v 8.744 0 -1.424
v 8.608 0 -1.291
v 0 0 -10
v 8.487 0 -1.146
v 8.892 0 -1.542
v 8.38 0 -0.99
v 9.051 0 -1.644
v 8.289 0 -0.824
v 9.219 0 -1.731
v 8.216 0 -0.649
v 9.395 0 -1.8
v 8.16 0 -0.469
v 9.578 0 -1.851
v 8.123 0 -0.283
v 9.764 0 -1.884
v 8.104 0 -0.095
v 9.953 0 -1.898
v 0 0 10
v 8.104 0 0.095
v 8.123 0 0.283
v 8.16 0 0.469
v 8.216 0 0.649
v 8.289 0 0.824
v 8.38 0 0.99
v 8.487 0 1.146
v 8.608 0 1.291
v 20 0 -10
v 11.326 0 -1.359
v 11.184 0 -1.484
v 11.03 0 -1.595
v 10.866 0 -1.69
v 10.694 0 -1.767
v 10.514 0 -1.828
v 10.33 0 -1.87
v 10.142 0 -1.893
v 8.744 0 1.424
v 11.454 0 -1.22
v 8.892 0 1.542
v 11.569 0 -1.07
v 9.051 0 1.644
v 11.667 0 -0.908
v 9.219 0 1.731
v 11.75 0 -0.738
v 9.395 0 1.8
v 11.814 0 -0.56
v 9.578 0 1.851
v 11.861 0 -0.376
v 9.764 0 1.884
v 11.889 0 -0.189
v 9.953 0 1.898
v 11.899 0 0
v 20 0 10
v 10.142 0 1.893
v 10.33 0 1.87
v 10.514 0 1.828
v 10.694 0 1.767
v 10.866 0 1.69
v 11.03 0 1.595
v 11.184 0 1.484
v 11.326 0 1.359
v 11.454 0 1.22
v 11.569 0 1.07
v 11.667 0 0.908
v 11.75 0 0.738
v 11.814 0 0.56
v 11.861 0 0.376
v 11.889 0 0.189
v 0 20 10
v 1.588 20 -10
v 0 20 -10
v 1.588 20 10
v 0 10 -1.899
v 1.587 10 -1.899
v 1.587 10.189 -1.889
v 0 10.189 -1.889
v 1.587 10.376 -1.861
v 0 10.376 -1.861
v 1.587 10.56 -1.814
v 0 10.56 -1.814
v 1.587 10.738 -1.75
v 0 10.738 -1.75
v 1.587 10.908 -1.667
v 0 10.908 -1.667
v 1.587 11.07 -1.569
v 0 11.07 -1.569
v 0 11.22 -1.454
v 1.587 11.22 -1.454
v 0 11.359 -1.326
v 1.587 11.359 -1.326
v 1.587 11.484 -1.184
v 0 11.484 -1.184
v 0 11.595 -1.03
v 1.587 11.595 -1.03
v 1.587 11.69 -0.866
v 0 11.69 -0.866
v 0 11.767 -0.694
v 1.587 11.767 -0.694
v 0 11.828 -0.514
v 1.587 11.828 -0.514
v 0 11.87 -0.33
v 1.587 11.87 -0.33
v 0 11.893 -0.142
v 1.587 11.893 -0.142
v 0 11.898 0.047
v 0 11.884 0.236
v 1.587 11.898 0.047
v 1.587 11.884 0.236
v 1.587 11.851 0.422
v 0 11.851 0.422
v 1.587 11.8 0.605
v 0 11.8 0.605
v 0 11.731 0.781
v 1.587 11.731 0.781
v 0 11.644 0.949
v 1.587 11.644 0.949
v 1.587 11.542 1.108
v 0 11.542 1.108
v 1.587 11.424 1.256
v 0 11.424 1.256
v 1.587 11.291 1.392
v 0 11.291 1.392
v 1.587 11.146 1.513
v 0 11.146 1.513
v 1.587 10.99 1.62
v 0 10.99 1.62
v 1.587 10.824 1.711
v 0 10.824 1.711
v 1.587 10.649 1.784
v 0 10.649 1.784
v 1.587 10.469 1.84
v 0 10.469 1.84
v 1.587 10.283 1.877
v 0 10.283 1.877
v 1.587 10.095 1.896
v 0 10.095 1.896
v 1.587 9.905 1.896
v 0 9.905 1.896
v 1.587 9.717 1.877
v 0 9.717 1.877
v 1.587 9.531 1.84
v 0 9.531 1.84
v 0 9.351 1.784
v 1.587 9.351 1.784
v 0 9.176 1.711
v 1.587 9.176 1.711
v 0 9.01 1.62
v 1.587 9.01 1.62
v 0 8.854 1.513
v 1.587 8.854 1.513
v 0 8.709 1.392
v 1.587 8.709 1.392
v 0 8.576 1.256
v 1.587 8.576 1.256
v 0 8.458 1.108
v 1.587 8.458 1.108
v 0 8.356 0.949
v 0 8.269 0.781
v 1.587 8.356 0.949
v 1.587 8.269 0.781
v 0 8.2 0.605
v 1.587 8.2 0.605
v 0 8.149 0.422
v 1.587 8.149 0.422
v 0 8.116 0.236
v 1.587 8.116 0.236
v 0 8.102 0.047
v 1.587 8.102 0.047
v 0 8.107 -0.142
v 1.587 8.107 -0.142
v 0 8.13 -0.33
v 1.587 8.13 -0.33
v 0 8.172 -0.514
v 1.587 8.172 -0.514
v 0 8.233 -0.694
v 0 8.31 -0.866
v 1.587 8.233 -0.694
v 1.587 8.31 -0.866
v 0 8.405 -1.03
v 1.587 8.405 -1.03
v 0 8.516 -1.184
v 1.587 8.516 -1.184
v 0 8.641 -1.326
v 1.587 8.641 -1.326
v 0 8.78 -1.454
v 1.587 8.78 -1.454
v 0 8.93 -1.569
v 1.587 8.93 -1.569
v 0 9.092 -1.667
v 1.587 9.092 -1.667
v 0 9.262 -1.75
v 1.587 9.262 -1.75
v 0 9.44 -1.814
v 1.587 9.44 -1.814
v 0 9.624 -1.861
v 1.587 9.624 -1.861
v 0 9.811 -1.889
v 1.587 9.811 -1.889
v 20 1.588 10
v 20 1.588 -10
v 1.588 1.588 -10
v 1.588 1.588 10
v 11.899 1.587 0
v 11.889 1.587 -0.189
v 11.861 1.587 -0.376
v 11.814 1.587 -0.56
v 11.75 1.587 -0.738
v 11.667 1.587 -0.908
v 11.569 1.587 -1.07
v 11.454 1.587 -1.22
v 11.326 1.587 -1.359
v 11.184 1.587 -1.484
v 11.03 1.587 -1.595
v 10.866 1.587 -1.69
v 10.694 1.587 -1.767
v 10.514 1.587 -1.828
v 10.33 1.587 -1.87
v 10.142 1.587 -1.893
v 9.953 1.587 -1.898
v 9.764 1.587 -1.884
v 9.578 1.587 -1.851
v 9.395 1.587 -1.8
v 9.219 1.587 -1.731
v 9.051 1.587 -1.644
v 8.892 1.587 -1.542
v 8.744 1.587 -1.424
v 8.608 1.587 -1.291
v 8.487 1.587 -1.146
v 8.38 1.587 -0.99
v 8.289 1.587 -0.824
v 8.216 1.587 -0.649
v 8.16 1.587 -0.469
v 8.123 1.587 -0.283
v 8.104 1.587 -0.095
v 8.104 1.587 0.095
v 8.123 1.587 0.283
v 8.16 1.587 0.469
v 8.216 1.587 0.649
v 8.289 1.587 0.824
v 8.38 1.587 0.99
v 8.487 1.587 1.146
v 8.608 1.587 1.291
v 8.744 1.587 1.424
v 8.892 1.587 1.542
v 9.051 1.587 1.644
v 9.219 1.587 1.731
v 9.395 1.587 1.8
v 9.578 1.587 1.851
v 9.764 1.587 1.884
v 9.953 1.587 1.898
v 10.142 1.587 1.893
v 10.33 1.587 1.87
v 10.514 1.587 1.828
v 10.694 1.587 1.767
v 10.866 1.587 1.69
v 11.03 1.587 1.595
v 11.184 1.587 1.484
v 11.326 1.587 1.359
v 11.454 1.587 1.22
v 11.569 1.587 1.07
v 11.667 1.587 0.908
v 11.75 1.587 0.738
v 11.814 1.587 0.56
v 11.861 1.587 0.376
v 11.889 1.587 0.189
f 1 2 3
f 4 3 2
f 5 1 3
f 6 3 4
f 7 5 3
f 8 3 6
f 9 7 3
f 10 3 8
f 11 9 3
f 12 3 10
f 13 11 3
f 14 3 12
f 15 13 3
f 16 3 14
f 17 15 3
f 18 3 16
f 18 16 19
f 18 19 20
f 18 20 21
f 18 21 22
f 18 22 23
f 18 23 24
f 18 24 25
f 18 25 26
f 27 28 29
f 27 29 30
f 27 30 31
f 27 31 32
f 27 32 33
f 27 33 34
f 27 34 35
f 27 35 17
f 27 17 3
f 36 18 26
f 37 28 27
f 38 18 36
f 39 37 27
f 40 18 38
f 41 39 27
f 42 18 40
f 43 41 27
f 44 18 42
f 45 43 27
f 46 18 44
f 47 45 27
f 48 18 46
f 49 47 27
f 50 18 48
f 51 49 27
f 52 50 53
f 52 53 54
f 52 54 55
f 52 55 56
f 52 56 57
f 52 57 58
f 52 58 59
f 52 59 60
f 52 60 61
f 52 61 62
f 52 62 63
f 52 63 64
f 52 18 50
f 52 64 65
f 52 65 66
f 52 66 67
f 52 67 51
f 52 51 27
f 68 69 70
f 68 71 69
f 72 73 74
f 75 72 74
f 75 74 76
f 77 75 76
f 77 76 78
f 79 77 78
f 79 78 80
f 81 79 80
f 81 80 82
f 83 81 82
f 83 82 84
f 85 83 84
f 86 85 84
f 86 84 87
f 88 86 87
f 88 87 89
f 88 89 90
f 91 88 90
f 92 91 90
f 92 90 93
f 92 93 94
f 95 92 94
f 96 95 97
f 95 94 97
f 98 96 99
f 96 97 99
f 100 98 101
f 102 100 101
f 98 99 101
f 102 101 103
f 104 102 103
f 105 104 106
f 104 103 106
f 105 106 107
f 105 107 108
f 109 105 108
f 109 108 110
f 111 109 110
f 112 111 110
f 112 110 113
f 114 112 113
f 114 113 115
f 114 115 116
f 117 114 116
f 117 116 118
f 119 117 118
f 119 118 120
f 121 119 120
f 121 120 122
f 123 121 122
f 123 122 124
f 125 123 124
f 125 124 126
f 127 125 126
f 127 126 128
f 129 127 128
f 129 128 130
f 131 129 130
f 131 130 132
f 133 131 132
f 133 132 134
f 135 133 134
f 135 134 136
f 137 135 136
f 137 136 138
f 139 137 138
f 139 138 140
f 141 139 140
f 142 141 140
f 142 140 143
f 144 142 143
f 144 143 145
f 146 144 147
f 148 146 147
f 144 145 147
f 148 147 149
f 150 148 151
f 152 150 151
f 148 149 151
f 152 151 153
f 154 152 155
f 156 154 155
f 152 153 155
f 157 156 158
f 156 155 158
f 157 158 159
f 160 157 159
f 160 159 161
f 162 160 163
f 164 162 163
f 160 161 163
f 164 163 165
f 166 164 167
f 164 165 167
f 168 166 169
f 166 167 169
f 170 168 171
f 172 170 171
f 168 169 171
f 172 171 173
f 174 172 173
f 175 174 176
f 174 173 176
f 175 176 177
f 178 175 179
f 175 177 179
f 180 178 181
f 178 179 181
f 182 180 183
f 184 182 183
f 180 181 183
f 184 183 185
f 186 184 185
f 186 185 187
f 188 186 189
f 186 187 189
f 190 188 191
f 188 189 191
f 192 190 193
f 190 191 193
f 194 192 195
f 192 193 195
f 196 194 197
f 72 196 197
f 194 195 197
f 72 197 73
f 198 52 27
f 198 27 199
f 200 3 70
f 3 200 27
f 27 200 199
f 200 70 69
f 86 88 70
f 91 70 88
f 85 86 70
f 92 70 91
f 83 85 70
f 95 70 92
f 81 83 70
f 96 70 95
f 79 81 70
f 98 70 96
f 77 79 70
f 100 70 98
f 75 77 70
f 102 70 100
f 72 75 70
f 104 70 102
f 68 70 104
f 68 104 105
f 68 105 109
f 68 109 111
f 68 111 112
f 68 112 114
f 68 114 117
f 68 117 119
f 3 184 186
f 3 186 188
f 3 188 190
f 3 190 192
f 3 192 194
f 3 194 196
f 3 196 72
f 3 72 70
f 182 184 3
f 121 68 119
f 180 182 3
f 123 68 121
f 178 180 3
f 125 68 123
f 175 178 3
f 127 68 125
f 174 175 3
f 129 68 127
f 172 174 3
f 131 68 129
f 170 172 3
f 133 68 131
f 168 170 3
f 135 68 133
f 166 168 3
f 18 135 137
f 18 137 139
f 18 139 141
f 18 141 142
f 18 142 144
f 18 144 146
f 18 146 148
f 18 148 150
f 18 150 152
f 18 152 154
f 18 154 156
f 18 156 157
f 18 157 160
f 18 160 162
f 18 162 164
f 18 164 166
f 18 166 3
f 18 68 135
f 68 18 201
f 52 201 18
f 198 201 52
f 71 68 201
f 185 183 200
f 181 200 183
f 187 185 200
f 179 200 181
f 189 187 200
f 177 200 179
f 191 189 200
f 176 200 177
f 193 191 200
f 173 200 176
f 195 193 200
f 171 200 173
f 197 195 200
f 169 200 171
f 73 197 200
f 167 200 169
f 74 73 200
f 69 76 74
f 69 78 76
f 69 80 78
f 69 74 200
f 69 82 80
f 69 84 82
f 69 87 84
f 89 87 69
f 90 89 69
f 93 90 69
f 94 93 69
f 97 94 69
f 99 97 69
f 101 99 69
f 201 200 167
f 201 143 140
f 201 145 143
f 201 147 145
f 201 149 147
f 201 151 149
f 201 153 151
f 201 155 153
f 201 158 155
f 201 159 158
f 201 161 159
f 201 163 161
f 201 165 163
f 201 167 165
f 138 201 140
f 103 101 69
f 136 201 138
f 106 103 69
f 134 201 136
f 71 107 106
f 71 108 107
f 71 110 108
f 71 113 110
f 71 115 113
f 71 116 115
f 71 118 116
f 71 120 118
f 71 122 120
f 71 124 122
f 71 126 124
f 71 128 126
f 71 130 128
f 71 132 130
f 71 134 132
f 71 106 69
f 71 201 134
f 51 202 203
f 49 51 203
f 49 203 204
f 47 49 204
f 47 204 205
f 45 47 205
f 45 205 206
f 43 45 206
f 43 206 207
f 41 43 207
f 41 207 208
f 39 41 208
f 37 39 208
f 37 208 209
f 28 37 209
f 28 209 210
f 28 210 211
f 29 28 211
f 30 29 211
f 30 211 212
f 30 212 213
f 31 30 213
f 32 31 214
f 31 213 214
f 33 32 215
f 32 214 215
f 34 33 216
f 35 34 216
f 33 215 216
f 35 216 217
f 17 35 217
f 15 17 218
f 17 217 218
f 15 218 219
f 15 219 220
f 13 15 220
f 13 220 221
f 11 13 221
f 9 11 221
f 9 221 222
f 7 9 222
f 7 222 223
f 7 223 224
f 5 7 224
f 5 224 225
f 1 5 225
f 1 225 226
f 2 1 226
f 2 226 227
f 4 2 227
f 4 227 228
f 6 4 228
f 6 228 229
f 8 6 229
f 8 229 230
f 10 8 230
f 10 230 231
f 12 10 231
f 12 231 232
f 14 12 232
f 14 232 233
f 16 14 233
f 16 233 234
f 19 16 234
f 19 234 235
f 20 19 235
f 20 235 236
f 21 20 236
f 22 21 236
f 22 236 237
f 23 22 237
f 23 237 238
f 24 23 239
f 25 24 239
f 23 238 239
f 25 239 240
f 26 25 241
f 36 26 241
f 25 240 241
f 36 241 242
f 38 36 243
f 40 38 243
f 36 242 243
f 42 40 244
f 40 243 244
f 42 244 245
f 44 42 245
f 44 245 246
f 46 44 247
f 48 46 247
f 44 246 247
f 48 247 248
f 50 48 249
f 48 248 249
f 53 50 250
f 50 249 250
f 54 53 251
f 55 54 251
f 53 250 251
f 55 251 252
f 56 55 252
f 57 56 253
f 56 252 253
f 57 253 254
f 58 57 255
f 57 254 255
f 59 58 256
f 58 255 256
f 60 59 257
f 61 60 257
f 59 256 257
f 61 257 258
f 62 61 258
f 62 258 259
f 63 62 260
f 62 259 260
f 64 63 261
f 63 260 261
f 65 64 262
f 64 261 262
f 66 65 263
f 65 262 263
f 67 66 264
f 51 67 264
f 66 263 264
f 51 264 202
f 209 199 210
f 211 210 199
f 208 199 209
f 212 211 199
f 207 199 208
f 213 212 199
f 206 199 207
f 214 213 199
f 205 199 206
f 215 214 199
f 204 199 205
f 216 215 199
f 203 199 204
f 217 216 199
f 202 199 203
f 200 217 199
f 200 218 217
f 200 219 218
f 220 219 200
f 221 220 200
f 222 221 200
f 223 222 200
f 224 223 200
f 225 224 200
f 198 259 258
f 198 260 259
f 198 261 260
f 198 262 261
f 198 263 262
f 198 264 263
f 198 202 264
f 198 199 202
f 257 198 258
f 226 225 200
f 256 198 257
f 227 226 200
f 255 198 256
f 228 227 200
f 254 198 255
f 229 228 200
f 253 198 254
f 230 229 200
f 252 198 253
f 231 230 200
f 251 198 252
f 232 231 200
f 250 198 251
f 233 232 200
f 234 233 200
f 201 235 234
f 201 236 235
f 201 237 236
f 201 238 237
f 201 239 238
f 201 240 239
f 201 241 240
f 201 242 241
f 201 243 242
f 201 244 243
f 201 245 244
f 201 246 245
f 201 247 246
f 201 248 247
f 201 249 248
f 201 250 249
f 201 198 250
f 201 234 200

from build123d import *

# Parameters (mm, degrees)
BOSS_EXTRUDE1_DEPTH       = 10
F_6_CLEARANCE_HOLE1_D     = 3.7973
F_6_CLEARANCE_HOLE1_DEPTH = 20.001
F_6_CLEARANCE_HOLE1_TIP   = 1.140824014
F_6_CLEARANCE_HOLE2_D     = 3.7973


with BuildPart() as part:
    # Sketch1 → Boss-Extrude1 (new, symmetric)
    with BuildSketch(Plane.XY):
        Polygon((0, 20), (0, 0), (20, 0), (20, 1.5875), (1.5875, 1.5875), (1.5875, 20), align=None)
    extrude(amount=BOSS_EXTRUDE1_DEPTH, both=True)

    # #6 Clearance Hole1
    with Locations(Plane(origin=(0, 0, 0), x_dir=(-1, 0, 0), z_dir=(0, -1, 0))):
        with Locations((-10, 0)):
            Hole(F_6_CLEARANCE_HOLE1_D / 2, depth=F_6_CLEARANCE_HOLE1_DEPTH)
            with Locations((0, 0, -(F_6_CLEARANCE_HOLE1_DEPTH + F_6_CLEARANCE_HOLE1_TIP / 2))):  # 118° drill point
                Cone(0, F_6_CLEARANCE_HOLE1_D / 2, F_6_CLEARANCE_HOLE1_TIP, mode=Mode.SUBTRACT)

    # #6 Clearance Hole2 (through all)
    with Locations(Plane.ZY):
        with Locations((0, 10)):
            Hole(F_6_CLEARANCE_HOLE2_D / 2)


solid = part.part
